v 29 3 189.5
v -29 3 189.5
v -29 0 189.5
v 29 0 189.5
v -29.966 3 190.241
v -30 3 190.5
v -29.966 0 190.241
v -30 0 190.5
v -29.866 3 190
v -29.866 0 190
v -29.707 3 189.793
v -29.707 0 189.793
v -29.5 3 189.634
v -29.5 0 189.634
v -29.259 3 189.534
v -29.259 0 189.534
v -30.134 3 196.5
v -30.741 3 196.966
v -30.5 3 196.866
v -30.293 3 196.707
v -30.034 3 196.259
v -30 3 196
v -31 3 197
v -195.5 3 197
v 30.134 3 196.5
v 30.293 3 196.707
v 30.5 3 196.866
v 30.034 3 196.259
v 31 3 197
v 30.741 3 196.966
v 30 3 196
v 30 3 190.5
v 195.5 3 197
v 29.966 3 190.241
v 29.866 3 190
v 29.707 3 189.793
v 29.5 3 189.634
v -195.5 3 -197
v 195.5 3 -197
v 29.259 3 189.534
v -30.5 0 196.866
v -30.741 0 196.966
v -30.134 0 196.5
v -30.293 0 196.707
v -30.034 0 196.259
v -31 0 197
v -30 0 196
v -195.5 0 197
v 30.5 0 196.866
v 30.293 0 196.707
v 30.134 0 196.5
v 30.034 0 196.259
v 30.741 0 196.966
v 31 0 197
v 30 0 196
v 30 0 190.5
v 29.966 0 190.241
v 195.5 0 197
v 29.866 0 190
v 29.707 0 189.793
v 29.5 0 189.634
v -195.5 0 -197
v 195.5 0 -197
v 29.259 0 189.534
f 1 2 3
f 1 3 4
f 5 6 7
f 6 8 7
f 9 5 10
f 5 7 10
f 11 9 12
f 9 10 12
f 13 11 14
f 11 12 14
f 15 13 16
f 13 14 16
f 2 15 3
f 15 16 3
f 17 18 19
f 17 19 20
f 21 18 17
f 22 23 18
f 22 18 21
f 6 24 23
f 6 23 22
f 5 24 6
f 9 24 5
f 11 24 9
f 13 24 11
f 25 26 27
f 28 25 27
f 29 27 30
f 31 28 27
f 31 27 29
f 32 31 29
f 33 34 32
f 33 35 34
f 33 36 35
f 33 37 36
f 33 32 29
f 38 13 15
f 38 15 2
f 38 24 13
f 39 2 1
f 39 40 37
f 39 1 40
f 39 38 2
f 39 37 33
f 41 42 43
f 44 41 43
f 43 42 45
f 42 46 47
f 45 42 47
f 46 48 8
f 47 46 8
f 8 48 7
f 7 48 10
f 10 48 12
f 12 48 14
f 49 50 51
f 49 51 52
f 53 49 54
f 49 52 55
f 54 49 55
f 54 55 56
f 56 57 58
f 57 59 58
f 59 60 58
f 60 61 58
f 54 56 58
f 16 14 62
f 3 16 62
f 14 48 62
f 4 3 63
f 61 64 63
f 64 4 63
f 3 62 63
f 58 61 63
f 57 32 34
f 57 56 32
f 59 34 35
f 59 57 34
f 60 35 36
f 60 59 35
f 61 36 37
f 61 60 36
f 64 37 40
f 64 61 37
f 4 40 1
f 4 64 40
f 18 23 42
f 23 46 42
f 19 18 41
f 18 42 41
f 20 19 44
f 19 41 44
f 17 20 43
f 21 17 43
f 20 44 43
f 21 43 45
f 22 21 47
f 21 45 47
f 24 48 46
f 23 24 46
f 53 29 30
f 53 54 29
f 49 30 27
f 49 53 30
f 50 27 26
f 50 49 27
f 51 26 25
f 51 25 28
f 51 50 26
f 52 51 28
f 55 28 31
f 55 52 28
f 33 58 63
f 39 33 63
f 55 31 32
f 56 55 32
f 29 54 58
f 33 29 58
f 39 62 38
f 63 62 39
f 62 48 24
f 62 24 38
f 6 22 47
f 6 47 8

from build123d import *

# Parameters (mm, degrees)
SKETCH_1_W          = 391
SKETCH_1_H          = 394
EXTRUDE_1_DEPTH     = 3
SKETCH_2_W          = 60
SKETCH_2_H          = 7.5
CUT_EXTRUDE_1_DEPTH = 278.557651669
FILLET_1_R          = 1


with BuildPart() as part:
    # 草圖1 → 填料-伸長1 (new body)
    with BuildSketch(Plane(origin=(0, 0, 0), x_dir=(1, 0, 0), z_dir=(0, 1, 0))):
        Rectangle(SKETCH_1_W, SKETCH_1_H)
    extrude(amount=EXTRUDE_1_DEPTH)

    # 草圖2 → 除料-伸長1 (cut, through all)
    with BuildSketch(Plane(origin=(0, 3, 0), x_dir=(1, 0, 0), z_dir=(0, 1, 0))):
        with Locations((0, -193.25)):
            Rectangle(SKETCH_2_W, SKETCH_2_H)
    extrude(amount=-CUT_EXTRUDE_1_DEPTH, mode=Mode.SUBTRACT)

    # 圓角1
    fillet_1_edges = [part.edges().sort_by_distance(p)[0] for p in [
        (-30, 1.5, 197),
        (-30, 1.5, 189.5),
        (30, 1.5, 189.5),
        (30, 1.5, 197),
    ]]
    fillet(fillet_1_edges, radius=FILLET_1_R)


solid = part.part
